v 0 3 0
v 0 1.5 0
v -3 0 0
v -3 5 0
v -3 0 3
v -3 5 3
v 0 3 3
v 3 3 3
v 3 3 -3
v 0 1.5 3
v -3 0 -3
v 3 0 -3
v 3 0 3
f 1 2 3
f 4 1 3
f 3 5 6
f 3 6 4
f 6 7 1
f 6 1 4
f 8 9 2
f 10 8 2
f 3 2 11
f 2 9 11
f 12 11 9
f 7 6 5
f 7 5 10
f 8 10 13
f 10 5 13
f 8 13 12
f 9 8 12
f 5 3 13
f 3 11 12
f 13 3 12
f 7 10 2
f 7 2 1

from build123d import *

# Parameters (mm, degrees)
SKETCH1_W           = 6
SKETCH1_H           = 6
BOSS_EXTRUDE1_DEPTH = 5
CUT_EXTRUDE5_DEPTH  = 3
CUT_EXTRUDE6_DEPTH  = 3


with BuildPart() as part:
    # Sketch1 → Boss-Extrude1 (new body)
    with BuildSketch(Plane(origin=(0, 0, 0), x_dir=(1, 0, 0), z_dir=(0, 1, 0))):
        Rectangle(SKETCH1_W, SKETCH1_H)
    extrude(amount=BOSS_EXTRUDE1_DEPTH)

    # Sketch8 → Cut-Extrude5 (cut)
    with BuildSketch(Plane.XY.offset(3)):
        Polygon((3, 3), (0, 1.5), (0, 3), (-3, 5), (3, 5), align=None)
    extrude(amount=-CUT_EXTRUDE5_DEPTH, mode=Mode.SUBTRACT)

    # Sketch9 → Cut-Extrude6 (cut)
    with BuildSketch(Plane(origin=(0, 0, -3), x_dir=(-1, 0, 0), z_dir=(0, 0, -1))):
        Polygon((-3, 5), (-3, 3), (0, 1.5), (3, 0), (3, 5), align=None)
    extrude(amount=-CUT_EXTRUDE6_DEPTH, mode=Mode.SUBTRACT)


solid = part.part
